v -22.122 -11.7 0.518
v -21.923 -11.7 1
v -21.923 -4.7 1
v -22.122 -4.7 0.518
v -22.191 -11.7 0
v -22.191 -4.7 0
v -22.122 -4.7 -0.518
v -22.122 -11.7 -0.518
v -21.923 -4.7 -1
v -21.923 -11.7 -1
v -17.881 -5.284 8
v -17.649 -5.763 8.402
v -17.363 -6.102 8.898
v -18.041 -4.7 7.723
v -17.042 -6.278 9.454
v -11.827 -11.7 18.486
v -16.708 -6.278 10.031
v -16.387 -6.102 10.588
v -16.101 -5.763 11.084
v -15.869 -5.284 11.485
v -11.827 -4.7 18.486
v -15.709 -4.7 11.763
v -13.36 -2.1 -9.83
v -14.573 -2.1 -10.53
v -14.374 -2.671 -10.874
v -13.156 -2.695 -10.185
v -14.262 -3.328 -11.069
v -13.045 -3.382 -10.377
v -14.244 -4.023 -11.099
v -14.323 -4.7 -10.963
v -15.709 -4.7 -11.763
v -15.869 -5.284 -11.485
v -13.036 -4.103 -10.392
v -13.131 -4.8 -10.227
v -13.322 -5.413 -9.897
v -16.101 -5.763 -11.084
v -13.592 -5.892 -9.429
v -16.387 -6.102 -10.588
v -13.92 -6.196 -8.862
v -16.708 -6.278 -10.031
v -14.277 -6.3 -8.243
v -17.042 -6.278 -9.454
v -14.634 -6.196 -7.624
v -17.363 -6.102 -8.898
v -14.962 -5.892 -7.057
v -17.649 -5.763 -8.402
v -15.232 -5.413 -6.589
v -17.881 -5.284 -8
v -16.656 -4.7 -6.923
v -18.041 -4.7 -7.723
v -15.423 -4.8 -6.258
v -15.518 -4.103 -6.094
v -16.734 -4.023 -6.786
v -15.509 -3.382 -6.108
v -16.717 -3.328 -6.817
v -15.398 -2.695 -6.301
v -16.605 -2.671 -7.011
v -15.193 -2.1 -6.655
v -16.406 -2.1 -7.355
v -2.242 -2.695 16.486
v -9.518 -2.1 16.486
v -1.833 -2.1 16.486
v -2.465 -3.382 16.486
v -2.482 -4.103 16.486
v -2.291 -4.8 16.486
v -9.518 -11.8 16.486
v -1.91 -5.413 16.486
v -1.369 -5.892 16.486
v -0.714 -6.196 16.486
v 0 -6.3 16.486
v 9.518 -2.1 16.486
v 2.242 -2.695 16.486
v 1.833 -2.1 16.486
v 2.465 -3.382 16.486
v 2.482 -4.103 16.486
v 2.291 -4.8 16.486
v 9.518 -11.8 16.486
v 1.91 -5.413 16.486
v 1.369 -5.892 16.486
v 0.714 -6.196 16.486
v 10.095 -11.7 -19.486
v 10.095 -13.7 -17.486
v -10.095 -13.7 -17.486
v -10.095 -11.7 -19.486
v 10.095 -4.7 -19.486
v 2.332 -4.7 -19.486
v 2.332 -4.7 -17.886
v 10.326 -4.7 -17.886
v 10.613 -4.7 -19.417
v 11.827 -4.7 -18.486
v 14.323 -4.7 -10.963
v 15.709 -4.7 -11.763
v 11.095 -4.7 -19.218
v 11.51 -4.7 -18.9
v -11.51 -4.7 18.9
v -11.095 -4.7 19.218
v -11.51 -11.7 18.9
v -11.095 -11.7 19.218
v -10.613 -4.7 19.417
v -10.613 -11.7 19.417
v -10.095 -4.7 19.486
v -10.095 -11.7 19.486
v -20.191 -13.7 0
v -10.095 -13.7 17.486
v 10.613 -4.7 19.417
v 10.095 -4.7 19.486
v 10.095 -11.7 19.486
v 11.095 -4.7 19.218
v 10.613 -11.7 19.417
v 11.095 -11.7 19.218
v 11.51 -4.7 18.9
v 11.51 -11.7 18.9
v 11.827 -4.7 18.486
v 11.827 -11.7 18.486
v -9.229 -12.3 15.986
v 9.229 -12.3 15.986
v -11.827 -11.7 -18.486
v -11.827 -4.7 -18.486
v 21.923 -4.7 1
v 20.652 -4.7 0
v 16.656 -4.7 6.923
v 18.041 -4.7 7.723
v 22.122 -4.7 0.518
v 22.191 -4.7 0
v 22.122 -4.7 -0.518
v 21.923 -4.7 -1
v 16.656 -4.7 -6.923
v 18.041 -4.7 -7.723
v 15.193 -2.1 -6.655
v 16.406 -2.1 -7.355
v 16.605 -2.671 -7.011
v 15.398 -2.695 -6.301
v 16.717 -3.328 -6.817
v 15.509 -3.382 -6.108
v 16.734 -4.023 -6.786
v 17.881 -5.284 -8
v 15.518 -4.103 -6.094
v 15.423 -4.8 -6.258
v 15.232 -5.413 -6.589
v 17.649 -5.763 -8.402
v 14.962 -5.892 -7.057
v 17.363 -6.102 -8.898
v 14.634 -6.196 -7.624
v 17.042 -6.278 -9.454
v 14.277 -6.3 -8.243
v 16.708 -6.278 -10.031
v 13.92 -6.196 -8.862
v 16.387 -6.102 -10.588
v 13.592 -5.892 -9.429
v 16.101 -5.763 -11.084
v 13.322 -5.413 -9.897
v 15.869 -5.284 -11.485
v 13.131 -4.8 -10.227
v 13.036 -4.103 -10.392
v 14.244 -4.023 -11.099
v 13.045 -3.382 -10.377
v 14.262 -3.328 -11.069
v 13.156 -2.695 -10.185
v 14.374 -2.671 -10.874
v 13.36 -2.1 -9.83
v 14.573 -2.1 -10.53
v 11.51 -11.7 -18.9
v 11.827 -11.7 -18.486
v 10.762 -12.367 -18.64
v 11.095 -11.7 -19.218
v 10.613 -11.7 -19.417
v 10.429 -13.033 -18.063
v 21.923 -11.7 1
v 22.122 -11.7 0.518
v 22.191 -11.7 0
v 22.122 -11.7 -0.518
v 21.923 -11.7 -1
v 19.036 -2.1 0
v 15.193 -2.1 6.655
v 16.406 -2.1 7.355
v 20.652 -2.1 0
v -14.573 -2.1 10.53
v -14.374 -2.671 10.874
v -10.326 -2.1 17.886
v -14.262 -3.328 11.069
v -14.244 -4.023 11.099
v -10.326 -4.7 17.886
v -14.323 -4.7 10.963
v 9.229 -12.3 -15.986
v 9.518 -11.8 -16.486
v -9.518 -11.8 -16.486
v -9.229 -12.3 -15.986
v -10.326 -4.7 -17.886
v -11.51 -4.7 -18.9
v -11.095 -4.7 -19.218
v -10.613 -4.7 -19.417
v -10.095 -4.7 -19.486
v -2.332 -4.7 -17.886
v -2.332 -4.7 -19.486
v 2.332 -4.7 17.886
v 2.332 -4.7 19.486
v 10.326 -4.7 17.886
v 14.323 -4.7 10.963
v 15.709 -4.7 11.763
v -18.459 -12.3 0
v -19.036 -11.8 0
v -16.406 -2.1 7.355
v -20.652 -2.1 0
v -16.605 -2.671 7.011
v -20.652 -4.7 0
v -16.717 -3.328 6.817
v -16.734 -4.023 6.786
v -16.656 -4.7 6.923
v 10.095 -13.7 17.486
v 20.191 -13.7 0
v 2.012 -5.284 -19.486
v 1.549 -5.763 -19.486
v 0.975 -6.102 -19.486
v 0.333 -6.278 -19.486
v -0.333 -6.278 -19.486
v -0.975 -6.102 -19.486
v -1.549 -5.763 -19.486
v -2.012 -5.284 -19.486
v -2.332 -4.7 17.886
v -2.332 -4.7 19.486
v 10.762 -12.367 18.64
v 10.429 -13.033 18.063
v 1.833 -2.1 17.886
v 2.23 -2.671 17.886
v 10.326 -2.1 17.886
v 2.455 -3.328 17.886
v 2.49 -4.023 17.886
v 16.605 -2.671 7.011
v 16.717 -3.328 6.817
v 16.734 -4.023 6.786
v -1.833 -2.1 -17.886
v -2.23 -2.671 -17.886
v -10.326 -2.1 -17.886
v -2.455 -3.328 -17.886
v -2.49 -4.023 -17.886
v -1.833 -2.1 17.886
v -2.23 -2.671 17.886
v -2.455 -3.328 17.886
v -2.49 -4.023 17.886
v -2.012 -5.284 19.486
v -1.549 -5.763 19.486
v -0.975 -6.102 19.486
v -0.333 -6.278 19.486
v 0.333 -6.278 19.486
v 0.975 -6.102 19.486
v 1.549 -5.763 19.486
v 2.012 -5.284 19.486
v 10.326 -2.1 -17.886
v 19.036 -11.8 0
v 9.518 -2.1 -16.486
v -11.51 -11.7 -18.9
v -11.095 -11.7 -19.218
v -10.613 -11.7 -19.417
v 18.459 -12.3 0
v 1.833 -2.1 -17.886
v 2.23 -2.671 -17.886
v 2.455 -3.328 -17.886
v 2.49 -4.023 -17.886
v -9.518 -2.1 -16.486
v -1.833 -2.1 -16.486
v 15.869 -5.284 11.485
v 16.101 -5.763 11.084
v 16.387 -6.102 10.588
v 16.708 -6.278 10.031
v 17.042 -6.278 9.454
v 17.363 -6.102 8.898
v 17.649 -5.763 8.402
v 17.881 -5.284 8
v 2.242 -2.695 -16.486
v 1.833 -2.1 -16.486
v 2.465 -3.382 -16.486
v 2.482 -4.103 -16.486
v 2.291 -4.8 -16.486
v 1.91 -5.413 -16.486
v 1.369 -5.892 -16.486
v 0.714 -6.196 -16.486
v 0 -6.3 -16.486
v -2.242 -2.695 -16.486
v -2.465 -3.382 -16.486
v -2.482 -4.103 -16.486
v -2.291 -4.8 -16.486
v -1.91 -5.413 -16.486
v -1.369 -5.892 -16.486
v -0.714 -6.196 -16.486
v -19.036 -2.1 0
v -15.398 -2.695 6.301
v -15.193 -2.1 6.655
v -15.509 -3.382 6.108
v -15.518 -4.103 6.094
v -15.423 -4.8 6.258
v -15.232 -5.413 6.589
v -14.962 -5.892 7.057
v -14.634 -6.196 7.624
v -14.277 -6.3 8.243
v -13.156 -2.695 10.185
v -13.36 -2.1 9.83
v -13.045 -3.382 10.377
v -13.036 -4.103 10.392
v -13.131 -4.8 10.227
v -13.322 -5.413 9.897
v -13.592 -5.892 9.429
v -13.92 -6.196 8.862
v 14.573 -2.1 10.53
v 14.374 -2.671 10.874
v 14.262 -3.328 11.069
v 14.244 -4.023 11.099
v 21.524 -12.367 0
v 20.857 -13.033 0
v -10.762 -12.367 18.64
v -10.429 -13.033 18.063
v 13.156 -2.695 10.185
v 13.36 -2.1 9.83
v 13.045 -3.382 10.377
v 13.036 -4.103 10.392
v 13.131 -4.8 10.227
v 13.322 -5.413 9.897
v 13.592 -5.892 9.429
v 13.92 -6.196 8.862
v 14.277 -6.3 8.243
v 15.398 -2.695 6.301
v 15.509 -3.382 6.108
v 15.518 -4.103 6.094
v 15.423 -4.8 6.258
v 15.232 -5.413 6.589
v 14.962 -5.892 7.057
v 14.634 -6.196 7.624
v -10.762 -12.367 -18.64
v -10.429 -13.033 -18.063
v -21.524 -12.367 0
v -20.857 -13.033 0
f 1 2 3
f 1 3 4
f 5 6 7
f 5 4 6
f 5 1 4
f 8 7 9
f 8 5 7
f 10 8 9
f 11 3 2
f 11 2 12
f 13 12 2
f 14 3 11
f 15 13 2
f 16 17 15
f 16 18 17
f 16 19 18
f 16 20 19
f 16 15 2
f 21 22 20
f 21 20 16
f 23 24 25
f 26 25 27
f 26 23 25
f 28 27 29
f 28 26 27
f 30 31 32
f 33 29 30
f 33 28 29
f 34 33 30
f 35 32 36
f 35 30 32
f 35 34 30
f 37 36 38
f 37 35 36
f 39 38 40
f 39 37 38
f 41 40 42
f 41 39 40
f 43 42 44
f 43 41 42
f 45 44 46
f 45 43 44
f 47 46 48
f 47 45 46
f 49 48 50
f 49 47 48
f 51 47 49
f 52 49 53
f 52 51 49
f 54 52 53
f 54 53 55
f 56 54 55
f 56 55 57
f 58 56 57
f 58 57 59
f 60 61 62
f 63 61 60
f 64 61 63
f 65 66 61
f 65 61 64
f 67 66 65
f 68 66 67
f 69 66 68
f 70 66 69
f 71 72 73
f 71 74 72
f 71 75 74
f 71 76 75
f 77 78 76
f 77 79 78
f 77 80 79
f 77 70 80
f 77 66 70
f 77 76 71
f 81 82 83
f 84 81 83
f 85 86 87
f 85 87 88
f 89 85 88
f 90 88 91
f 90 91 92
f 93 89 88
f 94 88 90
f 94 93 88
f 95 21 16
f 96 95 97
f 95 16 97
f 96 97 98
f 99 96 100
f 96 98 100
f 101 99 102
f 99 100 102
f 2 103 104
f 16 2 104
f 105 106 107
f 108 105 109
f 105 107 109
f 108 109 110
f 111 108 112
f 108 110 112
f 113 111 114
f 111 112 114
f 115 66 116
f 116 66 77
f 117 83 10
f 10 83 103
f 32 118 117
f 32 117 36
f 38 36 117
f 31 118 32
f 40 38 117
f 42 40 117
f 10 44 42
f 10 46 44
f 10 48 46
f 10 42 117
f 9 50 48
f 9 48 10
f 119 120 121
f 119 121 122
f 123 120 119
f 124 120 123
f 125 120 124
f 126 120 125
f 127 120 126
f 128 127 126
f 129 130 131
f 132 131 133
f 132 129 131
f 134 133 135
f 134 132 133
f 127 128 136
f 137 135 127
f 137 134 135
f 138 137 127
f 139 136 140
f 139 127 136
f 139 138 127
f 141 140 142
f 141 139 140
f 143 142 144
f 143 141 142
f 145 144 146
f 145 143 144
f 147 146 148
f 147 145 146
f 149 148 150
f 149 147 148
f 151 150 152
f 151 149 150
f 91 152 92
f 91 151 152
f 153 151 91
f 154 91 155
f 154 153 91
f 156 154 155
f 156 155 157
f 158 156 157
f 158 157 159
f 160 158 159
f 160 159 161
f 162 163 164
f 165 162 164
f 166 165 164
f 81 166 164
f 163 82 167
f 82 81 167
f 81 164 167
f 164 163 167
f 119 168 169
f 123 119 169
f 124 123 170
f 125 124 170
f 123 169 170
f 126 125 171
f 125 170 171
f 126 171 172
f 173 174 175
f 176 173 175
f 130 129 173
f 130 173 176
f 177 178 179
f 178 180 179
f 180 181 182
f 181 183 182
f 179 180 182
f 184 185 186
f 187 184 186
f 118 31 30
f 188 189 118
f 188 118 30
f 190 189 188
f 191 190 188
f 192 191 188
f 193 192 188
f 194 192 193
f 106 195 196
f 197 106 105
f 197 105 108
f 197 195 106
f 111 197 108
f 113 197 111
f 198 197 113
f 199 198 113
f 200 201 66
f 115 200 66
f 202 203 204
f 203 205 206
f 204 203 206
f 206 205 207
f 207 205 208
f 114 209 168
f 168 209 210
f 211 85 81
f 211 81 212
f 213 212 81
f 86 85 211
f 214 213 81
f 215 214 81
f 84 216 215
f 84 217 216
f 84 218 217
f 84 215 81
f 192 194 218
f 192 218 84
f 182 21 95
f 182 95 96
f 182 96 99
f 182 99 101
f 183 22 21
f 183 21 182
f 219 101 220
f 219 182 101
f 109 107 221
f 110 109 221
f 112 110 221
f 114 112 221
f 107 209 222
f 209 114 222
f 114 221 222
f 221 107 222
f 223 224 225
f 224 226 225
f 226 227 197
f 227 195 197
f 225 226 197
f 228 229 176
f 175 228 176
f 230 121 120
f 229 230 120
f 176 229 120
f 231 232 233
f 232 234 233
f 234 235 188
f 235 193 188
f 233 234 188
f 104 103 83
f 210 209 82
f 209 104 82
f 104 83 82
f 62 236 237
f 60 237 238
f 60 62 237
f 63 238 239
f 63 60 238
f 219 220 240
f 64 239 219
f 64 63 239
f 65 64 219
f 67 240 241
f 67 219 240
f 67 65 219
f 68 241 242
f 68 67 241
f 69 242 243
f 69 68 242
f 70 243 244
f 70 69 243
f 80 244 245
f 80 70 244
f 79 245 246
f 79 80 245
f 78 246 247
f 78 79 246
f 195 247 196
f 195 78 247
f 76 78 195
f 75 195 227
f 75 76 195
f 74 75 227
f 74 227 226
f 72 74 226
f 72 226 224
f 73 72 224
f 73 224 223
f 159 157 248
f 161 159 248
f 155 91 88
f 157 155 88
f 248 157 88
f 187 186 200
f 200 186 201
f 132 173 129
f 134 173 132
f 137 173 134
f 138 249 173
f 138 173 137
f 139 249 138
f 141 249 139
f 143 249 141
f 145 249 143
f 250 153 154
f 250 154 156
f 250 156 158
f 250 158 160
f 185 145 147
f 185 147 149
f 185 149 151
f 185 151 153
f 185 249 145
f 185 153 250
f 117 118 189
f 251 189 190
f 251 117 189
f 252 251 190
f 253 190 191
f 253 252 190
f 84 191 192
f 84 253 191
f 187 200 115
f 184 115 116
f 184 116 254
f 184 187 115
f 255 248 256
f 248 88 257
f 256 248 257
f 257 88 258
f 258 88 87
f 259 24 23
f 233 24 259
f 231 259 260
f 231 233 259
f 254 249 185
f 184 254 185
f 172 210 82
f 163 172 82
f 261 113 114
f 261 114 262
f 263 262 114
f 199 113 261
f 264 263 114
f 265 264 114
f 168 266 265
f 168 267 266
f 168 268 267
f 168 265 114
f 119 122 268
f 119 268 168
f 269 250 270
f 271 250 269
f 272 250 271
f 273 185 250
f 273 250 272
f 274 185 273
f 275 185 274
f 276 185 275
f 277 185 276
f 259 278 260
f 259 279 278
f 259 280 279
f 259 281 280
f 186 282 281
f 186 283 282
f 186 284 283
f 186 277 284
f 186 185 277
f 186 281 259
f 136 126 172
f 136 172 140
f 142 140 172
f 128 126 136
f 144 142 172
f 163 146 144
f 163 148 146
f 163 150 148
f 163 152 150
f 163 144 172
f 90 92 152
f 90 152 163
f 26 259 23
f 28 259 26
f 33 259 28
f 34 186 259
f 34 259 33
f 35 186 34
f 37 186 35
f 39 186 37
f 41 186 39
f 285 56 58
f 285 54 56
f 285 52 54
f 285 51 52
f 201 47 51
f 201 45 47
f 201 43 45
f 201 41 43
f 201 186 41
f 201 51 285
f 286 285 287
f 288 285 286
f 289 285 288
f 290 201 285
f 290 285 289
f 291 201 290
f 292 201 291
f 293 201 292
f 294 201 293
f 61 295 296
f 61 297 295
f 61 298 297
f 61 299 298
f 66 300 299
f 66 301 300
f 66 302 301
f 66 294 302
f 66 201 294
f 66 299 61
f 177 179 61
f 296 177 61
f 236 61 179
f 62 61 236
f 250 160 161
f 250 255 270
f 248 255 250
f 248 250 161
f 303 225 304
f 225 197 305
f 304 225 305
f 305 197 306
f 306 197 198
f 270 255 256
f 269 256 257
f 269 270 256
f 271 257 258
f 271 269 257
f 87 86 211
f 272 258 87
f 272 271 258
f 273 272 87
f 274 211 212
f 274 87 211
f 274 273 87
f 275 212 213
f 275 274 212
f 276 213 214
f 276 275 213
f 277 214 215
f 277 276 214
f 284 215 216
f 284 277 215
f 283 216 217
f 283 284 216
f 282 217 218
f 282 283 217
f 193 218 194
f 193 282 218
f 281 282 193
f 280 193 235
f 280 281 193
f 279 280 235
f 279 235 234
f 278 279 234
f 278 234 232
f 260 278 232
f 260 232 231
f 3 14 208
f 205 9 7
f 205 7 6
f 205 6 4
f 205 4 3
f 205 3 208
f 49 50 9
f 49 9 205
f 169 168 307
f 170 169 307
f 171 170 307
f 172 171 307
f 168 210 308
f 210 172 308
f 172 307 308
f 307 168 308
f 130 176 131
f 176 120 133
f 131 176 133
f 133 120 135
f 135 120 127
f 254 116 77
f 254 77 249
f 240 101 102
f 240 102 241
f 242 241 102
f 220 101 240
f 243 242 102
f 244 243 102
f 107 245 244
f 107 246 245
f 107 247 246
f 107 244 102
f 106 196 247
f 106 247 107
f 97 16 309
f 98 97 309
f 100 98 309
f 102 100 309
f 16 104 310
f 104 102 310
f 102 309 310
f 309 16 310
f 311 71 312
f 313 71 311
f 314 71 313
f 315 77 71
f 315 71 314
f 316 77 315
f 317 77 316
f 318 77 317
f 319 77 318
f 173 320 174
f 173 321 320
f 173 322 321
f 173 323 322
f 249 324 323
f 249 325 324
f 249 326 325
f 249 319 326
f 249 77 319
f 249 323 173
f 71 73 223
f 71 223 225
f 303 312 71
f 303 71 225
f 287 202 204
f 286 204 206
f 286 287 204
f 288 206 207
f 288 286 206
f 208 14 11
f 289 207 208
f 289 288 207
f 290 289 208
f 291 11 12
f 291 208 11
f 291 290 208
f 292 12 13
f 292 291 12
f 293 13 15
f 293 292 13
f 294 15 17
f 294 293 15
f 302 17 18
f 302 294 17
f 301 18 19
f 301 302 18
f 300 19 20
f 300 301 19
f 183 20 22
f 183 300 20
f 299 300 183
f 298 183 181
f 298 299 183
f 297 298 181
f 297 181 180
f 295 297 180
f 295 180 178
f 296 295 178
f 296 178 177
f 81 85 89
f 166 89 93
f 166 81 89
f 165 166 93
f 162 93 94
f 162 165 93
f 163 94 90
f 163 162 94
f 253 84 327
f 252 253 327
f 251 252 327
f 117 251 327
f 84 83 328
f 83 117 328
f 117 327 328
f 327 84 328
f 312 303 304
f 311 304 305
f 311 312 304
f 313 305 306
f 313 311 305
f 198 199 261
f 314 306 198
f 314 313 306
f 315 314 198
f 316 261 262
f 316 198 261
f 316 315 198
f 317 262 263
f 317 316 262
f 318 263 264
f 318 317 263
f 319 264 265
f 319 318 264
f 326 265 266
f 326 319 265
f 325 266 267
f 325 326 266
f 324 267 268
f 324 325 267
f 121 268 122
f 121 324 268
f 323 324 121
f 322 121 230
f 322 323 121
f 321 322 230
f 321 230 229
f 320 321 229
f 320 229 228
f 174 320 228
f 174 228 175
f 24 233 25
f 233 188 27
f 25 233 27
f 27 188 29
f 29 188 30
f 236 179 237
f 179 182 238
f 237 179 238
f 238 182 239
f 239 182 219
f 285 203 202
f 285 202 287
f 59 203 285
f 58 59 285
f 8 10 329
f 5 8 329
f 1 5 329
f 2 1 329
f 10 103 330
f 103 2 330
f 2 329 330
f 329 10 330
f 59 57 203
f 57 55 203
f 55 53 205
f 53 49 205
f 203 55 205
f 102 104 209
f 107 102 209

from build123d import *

# Parameters (mm, degrees)
BOSS_EXTRUDE1_START = -3.7
BOSS_EXTRUDE1_DEPTH = 10
CUT_EXTRUDE1_DEPTH  = 8.6
BOSS_EXTRUDE2_DEPTH = 1.6
FILLET1_R           = 2
CUT_EXTRUDE4_START  = -1
CUT_EXTRUDE4_DEPTH  = 1
CUT_EXTRUDE3_REACH  = 48.892
SKETCH4_R           = 2.5
CIRPATTERN1_COUNT   = 6
CHAMFER1_SIZE       = 0.5
CHAMFER2_SIZE       = 2


with BuildPart() as part:
    # Sketch1 → Boss-Extrude1 (new body)
    with BuildSketch(Plane(origin=(0, 0, 0), x_dir=(1, 0, 0), z_dir=(0, 1, 0)).offset(BOSS_EXTRUDE1_START)):
        Polygon((22.5, 0), (11.25, 19.485571585), (-11.25, 19.485571585), (-22.5, 0), (-11.25, -19.485571585), (11.25, -19.485571585), align=None)
    extrude(amount=-BOSS_EXTRUDE1_DEPTH)

    # Sketch2 → Cut-Extrude1 (cut)
    with BuildSketch(Plane(origin=(0, -3.7, 0), x_dir=(1, 0, 0), z_dir=(0, 1, 0))):
        Polygon((9.517949192, -16.485571585), (19.035898385, 0), (9.517949192, 16.485571585), (-9.517949192, 16.485571585), (-19.035898385, 0), (-9.517949192, -16.485571585), align=None)
    extrude(amount=-CUT_EXTRUDE1_DEPTH, mode=Mode.SUBTRACT)

    # Sketch3 → Boss-Extrude2 (add)
    with BuildSketch(Plane(origin=(0, -3.7, 0), x_dir=(1, 0, 0), z_dir=(0, 1, 0))):
        Polygon((10.326239569, -17.885571585), (20.652479139, 0), (10.326239569, 17.885571585), (-10.326239569, 17.885571585), (-20.652479139, 0), (-10.326239569, -17.885571585), align=None)
        Polygon((-9.517949192, -16.485571585), (9.517949192, -16.485571585), (19.035898385, 0), (9.517949192, 16.485571585), (-9.517949192, 16.485571585), (-19.035898385, 0), align=None, mode=Mode.SUBTRACT)
    extrude(amount=BOSS_EXTRUDE2_DEPTH)

    # Fillet1
    fillet1_edges = [part.edges().sort_by_distance(p)[0] for p in [
        (22.5, -8.7, 0),
        (11.25, -8.7, 19.485571585),
        (-11.25, -8.7, 19.485571585),
        (-22.5, -8.7, 0),
        (-11.25, -8.7, -19.485571585),
        (11.25, -8.7, -19.485571585),
    ]]
    fillet(fillet1_edges, radius=FILLET1_R)

    # Sketch6 → Cut-Extrude4 (cut)
    with BuildSketch(Plane(origin=(0, -3.7, 0), x_dir=(1, 0, 0), z_dir=(0, 1, 0)).offset(CUT_EXTRUDE4_START)):
        with BuildLine():
            Line((11.827350269, -18.485571585), (21.922649731, -1))
            ThreePointArc((21.922649731, -1), (22.190598923, 0), (21.922649731, 1))
            Line((21.922649731, 1), (11.827350269, 18.485571585))
            ThreePointArc((11.827350269, 18.485571585), (11.095299462, 19.217622393), (10.095299462, 19.485571585))
            Line((10.095299462, 19.485571585), (-10.095299462, 19.485571585))
            ThreePointArc((-10.095299462, 19.485571585), (-11.095299462, 19.217622393), (-11.827350269, 18.485571585))
            Line((-11.827350269, 18.485571585), (-21.922649731, 1))
            ThreePointArc((-21.922649731, 1), (-22.190598923, 0), (-21.922649731, -1))
            Line((-21.922649731, -1), (-11.827350269, -18.485571585))
            ThreePointArc((-11.827350269, -18.485571585), (-11.095299462, -19.217622393), (-10.095299462, -19.485571585))
            Line((-10.095299462, -19.485571585), (10.095299462, -19.485571585))
            ThreePointArc((10.095299462, -19.485571585), (11.095299462, -19.217622393), (11.827350269, -18.485571585))
        make_face()
        Polygon((10.326239569, -17.885571585), (20.652479139, 0), (10.326239569, 17.885571585), (-10.326239569, 17.885571585), (-20.652479139, 0), (-10.326239569, -17.885571585), align=None, mode=Mode.SUBTRACT)
    extrude(amount=CUT_EXTRUDE4_DEPTH, mode=Mode.SUBTRACT)

    # Sketch4 → Cut-Extrude3 (cut, up to next)
    with BuildSketch(Plane(origin=(0, 0, -19.485571585), x_dir=(-1, 0, 0), z_dir=(0, 0, -1)), mode=Mode.PRIVATE) as cut_extrude3_sk1:
        with Locations((0, -3.8)):
            Circle(SKETCH4_R)
    cut_extrude3_tool1 = extrude(cut_extrude3_sk1.sketch, amount=-CUT_EXTRUDE3_REACH, mode=Mode.PRIVATE) & part.part
    cut_extrude3 = cut_extrude3_tool1.solids().sort_by_distance((0, -3.8, -19.485572))[0]
    add(cut_extrude3, mode=Mode.SUBTRACT)

    # CirPattern1: Cut-Extrude3 ×6 about axis
    cirpattern1_axis = Axis((0, -12.18, 0), (0, 1, 0))
    for i in range(1, CIRPATTERN1_COUNT):
        add(cut_extrude3.rotate(cirpattern1_axis, i * 360 / CIRPATTERN1_COUNT), mode=Mode.SUBTRACT)

    # Chamfer1
    chamfer1_edges = [part.edges().sort_by_distance(p)[0] for p in [
        (-14.276923789, -12.3, 8.242785793),
        (-14.276923789, -12.3, -8.242785793),
        (0, -12.3, -16.485571585),
        (14.276923789, -12.3, -8.242785793),
        (14.276923789, -12.3, 8.242785793),
        (0, -12.3, 16.485571585),
    ]]
    chamfer(chamfer1_edges, length=CHAMFER1_SIZE)

    # Chamfer2
    chamfer2_edges = [part.edges().sort_by_distance(p)[0] for p in [
        (0, -13.7, 19.485571585),
        (11.095299462, -13.7, 19.217622393),
        (-11.095299462, -13.7, 19.217622393),
        (16.875, -13.7, 9.742785793),
        (-16.875, -13.7, 9.742785793),
        (22.190598923, -13.7, 0),
        (-22.190598923, -13.7, 0),
        (16.875, -13.7, -9.742785793),
        (-16.875, -13.7, -9.742785793),
        (11.095299462, -13.7, -19.217622393),
        (-11.095299462, -13.7, -19.217622393),
        (0, -13.7, -19.485571585),
    ]]
    chamfer(chamfer2_edges, length=CHAMFER2_SIZE)


solid = part.part
